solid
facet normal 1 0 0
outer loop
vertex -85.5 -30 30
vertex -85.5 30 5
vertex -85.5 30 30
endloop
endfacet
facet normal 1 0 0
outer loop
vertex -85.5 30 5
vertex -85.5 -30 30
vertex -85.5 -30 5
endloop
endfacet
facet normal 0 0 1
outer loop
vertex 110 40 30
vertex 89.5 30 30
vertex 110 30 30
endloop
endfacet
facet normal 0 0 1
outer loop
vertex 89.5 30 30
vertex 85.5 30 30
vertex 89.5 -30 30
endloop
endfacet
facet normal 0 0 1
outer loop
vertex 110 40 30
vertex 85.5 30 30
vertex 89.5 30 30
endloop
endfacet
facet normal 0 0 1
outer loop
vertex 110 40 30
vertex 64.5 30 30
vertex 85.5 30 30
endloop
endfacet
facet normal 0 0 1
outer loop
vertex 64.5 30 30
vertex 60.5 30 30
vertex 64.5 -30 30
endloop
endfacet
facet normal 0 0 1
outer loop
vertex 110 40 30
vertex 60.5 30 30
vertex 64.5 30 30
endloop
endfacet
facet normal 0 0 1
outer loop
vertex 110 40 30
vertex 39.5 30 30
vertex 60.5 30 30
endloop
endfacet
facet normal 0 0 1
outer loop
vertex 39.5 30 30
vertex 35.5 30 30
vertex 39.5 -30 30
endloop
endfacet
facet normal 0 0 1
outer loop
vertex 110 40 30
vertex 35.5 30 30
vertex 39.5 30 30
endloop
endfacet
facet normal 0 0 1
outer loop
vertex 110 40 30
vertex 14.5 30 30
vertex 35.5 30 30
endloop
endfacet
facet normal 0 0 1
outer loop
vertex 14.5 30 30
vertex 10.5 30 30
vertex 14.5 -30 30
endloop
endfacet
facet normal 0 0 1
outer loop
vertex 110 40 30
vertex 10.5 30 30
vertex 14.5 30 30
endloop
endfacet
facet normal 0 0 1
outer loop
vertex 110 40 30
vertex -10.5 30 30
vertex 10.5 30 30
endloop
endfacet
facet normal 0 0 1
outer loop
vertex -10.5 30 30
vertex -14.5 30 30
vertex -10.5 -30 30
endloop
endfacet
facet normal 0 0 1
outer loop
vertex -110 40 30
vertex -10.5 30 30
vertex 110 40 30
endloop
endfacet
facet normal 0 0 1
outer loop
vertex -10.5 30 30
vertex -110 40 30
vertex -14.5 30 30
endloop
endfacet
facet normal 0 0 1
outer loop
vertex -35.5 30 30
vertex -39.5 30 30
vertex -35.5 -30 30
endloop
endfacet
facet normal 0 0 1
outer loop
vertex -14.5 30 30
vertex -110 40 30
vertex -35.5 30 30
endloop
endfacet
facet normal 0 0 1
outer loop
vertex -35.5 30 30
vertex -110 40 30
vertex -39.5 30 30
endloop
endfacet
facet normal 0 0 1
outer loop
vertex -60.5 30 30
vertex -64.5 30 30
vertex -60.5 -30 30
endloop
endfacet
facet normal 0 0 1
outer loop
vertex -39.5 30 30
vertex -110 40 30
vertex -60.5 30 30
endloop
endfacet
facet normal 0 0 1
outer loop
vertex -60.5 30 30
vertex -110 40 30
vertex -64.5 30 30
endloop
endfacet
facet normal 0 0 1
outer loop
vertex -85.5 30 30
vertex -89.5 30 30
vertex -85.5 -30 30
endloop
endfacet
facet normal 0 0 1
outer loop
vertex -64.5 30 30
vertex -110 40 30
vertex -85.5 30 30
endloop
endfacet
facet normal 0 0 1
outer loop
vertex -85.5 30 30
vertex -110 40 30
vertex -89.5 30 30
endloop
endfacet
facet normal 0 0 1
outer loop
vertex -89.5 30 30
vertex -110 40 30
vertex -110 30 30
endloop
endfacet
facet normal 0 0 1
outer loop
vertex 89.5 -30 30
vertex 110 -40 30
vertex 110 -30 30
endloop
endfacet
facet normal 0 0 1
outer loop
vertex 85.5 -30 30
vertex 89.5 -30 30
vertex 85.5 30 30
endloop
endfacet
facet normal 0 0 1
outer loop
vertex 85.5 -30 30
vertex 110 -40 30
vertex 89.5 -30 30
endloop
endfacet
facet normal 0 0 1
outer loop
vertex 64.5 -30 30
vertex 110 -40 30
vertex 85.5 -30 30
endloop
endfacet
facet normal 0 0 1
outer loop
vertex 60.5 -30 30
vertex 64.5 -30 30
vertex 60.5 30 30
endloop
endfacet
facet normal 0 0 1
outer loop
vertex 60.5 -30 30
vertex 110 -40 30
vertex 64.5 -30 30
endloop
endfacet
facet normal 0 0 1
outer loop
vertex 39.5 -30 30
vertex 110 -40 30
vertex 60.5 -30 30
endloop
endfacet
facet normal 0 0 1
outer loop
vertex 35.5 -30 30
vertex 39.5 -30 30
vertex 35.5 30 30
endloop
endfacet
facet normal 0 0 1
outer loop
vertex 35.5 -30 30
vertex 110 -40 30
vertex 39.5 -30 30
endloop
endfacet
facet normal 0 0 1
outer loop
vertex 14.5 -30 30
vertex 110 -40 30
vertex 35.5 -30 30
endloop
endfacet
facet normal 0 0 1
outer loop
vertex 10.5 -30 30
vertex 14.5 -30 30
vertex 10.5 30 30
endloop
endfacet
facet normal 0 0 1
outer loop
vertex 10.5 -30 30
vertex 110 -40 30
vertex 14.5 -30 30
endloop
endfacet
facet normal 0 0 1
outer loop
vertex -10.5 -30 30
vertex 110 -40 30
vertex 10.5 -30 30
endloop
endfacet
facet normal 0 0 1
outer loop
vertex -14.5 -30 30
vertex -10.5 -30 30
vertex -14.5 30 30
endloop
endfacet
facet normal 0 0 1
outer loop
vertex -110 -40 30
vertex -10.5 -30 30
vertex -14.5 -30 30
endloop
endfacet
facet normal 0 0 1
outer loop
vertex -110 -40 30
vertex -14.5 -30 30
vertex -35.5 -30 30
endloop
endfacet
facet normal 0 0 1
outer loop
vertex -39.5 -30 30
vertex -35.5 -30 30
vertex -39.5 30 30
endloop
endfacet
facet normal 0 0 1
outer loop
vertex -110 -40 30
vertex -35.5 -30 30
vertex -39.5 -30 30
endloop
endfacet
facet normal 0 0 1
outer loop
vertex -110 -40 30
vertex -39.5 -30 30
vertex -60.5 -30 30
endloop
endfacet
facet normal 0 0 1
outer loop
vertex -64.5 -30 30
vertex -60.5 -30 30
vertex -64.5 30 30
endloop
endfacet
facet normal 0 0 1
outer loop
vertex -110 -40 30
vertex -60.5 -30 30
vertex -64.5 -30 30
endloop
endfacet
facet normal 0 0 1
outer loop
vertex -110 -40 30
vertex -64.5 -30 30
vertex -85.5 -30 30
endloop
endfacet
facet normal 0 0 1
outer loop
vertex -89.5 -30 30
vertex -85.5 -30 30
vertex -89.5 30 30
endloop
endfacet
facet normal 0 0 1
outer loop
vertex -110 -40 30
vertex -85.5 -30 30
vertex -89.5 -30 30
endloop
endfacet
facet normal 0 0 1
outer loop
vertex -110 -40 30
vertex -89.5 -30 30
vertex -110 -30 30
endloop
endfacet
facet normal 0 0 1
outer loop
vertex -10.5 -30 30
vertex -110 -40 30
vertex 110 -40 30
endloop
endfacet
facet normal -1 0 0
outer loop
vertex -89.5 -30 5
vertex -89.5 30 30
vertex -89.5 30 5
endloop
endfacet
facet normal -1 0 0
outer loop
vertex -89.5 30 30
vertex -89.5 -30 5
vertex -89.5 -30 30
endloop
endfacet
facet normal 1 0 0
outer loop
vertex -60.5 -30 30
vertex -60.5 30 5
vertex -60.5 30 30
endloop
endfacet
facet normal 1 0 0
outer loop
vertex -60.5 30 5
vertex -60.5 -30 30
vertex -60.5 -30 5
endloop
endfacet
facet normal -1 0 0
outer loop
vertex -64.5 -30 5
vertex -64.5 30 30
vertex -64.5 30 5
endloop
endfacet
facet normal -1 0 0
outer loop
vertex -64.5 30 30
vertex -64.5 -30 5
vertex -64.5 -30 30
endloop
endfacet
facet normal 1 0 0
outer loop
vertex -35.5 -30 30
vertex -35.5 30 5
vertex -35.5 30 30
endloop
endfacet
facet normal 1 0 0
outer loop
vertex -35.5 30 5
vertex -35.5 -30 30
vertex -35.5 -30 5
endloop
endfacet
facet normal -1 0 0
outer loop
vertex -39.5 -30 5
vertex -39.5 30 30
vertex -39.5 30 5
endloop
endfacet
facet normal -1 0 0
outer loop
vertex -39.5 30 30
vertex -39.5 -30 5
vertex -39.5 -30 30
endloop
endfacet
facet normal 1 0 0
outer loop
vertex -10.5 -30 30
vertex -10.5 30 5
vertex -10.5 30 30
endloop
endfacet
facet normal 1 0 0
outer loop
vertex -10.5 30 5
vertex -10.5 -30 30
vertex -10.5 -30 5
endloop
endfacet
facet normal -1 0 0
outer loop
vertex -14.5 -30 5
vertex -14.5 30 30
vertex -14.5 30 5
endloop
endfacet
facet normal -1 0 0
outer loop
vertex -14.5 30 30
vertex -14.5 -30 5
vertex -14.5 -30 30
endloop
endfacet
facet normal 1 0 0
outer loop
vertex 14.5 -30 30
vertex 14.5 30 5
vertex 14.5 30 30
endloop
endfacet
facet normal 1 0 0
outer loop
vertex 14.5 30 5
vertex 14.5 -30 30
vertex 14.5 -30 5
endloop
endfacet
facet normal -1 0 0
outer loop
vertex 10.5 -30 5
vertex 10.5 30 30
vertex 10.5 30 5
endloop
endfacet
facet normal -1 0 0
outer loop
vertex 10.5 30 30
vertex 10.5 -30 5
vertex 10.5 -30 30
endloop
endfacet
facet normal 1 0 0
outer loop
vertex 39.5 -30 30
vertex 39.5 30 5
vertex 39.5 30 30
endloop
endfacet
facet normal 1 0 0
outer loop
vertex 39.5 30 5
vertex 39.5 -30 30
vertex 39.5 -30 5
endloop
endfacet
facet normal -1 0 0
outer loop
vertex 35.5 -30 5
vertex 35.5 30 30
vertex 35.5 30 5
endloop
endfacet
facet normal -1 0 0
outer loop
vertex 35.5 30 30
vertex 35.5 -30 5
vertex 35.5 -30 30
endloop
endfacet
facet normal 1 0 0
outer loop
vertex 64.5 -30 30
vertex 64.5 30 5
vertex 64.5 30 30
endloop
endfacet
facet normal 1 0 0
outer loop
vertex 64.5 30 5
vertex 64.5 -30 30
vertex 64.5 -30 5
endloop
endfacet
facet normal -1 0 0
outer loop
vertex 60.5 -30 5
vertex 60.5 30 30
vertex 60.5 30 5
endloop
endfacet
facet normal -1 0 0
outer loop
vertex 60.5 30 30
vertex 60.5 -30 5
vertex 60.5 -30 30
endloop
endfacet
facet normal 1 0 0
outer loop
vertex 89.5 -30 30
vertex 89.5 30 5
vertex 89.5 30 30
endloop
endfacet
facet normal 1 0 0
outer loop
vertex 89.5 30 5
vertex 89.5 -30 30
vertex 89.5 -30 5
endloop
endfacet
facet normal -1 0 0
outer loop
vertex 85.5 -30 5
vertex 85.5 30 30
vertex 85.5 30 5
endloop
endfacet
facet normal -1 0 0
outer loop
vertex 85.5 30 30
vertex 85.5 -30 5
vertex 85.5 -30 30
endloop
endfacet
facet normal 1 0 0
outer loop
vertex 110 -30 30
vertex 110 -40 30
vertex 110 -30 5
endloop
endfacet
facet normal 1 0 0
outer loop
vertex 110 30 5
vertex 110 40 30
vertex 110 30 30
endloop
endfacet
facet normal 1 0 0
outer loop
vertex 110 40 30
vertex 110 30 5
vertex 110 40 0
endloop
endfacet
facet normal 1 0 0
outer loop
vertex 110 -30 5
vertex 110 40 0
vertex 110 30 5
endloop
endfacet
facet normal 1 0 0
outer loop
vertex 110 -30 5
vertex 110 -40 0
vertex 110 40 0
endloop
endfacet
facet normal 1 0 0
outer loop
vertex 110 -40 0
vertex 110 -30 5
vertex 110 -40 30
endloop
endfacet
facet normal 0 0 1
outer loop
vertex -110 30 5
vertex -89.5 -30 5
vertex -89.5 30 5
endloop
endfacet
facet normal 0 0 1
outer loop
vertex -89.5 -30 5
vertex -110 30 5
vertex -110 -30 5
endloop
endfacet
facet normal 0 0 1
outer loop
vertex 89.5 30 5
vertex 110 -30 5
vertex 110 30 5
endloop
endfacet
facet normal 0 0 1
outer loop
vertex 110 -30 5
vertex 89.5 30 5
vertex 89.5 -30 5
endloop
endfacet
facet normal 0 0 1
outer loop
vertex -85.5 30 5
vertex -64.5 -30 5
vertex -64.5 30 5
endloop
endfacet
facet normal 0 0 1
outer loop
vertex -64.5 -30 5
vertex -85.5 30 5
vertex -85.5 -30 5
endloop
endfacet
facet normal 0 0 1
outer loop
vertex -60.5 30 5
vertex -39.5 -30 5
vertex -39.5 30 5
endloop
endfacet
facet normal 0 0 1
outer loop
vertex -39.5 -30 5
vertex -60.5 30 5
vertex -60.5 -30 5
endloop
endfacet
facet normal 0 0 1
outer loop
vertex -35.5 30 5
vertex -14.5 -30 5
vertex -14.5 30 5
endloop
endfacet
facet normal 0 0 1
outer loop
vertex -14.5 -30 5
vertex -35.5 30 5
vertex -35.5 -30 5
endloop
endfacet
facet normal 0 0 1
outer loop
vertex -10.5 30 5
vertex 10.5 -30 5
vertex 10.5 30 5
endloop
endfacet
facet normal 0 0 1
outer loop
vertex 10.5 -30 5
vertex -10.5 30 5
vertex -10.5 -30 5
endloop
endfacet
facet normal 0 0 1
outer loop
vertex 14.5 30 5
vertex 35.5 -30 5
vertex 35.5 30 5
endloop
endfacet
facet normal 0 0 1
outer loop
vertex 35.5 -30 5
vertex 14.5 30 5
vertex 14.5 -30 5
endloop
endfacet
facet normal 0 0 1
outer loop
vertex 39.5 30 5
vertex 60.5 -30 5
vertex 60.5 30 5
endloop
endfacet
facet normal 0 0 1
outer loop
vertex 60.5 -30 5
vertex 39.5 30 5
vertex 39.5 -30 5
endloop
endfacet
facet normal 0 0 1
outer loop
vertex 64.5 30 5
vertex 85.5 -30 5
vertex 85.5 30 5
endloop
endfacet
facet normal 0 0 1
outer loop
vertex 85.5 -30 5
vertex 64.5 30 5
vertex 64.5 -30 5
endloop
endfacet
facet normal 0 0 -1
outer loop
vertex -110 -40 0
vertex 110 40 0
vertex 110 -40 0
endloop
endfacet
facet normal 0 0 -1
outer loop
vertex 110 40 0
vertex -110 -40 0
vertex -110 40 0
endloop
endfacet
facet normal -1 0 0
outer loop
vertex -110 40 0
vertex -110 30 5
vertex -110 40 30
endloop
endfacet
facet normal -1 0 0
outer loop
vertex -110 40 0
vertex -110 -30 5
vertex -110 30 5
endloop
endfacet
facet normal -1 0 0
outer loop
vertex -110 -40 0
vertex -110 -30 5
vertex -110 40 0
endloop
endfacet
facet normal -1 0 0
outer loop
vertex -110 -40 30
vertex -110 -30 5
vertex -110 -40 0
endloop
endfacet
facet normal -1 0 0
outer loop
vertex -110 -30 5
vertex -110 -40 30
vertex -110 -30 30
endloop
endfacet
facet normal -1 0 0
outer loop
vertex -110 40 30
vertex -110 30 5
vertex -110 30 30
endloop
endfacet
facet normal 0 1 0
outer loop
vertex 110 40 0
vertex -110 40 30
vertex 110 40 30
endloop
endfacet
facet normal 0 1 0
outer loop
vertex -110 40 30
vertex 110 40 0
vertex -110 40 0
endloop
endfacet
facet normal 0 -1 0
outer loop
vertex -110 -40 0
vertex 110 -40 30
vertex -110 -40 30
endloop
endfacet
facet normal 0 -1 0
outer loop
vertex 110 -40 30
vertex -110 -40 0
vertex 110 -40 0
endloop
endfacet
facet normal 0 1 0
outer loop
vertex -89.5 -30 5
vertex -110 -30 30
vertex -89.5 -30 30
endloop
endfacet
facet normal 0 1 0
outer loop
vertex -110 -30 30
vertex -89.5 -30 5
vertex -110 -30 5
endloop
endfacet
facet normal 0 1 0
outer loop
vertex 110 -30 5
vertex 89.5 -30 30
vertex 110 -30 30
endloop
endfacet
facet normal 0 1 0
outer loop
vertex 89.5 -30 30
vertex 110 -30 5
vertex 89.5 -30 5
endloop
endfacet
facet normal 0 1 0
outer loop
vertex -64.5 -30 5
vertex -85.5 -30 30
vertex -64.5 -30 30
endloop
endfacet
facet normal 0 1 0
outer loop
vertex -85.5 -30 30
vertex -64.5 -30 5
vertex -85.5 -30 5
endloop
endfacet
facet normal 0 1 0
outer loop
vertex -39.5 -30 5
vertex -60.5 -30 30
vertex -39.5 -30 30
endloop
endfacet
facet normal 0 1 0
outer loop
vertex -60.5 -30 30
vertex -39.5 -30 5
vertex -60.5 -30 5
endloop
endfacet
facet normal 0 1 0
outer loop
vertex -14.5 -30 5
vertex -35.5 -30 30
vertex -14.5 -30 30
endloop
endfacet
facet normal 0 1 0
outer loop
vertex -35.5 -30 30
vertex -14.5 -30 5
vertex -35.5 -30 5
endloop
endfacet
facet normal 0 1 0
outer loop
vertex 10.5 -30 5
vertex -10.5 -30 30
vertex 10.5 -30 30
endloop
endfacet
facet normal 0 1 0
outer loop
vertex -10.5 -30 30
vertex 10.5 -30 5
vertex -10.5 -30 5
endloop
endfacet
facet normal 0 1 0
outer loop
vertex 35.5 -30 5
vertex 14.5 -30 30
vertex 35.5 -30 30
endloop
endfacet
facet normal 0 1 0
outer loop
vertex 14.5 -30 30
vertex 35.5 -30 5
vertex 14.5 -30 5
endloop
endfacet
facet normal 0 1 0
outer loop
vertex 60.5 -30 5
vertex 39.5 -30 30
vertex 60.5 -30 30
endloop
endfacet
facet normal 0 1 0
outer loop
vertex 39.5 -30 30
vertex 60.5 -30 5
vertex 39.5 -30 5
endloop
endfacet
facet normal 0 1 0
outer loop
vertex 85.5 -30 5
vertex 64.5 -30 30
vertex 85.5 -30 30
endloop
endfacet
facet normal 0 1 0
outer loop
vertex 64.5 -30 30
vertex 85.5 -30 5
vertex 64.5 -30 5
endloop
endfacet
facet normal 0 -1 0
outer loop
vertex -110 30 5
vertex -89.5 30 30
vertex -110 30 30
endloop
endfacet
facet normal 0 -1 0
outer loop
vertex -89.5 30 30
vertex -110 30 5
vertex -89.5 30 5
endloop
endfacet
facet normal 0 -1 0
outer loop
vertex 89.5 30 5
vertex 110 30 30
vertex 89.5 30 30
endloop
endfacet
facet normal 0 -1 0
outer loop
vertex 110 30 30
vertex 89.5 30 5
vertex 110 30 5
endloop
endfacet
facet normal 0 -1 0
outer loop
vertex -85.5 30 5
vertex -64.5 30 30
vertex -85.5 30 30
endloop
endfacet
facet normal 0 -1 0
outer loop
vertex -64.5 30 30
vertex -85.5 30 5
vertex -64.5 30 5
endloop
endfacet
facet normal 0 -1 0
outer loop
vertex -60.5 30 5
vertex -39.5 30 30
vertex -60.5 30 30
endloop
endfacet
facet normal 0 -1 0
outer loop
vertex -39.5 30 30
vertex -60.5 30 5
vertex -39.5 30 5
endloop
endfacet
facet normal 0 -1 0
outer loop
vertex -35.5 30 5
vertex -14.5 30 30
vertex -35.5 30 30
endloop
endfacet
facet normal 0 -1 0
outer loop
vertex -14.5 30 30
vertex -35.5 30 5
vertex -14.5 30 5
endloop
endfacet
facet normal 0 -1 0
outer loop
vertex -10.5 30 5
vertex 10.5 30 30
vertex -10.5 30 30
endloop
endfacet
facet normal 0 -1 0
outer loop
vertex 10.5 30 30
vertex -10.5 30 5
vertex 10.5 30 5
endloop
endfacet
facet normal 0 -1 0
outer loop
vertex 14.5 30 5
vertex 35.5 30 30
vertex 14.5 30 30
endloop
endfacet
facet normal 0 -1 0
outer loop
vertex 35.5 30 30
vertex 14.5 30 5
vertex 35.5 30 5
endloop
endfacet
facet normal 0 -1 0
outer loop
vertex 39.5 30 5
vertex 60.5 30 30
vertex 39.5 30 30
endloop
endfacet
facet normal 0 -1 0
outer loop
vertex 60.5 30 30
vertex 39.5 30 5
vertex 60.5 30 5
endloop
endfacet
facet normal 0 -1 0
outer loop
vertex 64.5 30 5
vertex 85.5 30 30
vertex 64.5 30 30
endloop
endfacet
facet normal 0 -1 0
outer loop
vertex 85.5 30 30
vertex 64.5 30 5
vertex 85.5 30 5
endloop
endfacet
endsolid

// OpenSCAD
$fn = 32;

// ----------------------------------------------------------------------
// Rib frame 220 x 80 x 30
// 8 ribs at 25 mm pitch
// ----------------------------------------------------------------------

// --- parameters (mm) ---
frame = [220, 80, 5];  // base plate size (x, y, z)
rail_w = 10;           // side rail width
ribs = 8;              // number of ribs
rib_t = 4;             // rib thickness
rib_h = 25;            // rib height above the base plate
pitch = 25;            // pitch between rib centres

// --- derived feature positions (mm) ---
span = (ribs - 1) * pitch;          // = 175   distance between the outer ribs
origin_x = -span / 2;               // = -87.5   X of the first rib
rib_len = frame[1] - 2 * rail_w + 2;  // = 62   rib length, 1 mm into each rail
feature_centers = [
  [origin_x + 0 * pitch, 0],
  [origin_x + 1 * pitch, 0],
  [origin_x + 2 * pitch, 0],
  [origin_x + 3 * pitch, 0],
  [origin_x + 4 * pitch, 0],
  [origin_x + 5 * pitch, 0],
  [origin_x + 6 * pitch, 0],
  [origin_x + 7 * pitch, 0]
];   // rib centre line, drives the rib loop

// base plate, two side rails, then the ribs read straight off feature_centers
union() {
  translate([-frame[0] / 2, -frame[1] / 2, 0]) cube(frame);
  translate([-frame[0] / 2, -frame[1] / 2, 0]) cube([frame[0], rail_w, frame[2] + rib_h]);
  translate([-frame[0] / 2, frame[1] / 2 - rail_w, 0]) cube([frame[0], rail_w, frame[2] + rib_h]);
  for (centre = feature_centers)
    translate([centre[0] - rib_t / 2, centre[1] - rib_len / 2, frame[2] - 1])
      cube([rib_t, rib_len, rib_h + 1]);
}
